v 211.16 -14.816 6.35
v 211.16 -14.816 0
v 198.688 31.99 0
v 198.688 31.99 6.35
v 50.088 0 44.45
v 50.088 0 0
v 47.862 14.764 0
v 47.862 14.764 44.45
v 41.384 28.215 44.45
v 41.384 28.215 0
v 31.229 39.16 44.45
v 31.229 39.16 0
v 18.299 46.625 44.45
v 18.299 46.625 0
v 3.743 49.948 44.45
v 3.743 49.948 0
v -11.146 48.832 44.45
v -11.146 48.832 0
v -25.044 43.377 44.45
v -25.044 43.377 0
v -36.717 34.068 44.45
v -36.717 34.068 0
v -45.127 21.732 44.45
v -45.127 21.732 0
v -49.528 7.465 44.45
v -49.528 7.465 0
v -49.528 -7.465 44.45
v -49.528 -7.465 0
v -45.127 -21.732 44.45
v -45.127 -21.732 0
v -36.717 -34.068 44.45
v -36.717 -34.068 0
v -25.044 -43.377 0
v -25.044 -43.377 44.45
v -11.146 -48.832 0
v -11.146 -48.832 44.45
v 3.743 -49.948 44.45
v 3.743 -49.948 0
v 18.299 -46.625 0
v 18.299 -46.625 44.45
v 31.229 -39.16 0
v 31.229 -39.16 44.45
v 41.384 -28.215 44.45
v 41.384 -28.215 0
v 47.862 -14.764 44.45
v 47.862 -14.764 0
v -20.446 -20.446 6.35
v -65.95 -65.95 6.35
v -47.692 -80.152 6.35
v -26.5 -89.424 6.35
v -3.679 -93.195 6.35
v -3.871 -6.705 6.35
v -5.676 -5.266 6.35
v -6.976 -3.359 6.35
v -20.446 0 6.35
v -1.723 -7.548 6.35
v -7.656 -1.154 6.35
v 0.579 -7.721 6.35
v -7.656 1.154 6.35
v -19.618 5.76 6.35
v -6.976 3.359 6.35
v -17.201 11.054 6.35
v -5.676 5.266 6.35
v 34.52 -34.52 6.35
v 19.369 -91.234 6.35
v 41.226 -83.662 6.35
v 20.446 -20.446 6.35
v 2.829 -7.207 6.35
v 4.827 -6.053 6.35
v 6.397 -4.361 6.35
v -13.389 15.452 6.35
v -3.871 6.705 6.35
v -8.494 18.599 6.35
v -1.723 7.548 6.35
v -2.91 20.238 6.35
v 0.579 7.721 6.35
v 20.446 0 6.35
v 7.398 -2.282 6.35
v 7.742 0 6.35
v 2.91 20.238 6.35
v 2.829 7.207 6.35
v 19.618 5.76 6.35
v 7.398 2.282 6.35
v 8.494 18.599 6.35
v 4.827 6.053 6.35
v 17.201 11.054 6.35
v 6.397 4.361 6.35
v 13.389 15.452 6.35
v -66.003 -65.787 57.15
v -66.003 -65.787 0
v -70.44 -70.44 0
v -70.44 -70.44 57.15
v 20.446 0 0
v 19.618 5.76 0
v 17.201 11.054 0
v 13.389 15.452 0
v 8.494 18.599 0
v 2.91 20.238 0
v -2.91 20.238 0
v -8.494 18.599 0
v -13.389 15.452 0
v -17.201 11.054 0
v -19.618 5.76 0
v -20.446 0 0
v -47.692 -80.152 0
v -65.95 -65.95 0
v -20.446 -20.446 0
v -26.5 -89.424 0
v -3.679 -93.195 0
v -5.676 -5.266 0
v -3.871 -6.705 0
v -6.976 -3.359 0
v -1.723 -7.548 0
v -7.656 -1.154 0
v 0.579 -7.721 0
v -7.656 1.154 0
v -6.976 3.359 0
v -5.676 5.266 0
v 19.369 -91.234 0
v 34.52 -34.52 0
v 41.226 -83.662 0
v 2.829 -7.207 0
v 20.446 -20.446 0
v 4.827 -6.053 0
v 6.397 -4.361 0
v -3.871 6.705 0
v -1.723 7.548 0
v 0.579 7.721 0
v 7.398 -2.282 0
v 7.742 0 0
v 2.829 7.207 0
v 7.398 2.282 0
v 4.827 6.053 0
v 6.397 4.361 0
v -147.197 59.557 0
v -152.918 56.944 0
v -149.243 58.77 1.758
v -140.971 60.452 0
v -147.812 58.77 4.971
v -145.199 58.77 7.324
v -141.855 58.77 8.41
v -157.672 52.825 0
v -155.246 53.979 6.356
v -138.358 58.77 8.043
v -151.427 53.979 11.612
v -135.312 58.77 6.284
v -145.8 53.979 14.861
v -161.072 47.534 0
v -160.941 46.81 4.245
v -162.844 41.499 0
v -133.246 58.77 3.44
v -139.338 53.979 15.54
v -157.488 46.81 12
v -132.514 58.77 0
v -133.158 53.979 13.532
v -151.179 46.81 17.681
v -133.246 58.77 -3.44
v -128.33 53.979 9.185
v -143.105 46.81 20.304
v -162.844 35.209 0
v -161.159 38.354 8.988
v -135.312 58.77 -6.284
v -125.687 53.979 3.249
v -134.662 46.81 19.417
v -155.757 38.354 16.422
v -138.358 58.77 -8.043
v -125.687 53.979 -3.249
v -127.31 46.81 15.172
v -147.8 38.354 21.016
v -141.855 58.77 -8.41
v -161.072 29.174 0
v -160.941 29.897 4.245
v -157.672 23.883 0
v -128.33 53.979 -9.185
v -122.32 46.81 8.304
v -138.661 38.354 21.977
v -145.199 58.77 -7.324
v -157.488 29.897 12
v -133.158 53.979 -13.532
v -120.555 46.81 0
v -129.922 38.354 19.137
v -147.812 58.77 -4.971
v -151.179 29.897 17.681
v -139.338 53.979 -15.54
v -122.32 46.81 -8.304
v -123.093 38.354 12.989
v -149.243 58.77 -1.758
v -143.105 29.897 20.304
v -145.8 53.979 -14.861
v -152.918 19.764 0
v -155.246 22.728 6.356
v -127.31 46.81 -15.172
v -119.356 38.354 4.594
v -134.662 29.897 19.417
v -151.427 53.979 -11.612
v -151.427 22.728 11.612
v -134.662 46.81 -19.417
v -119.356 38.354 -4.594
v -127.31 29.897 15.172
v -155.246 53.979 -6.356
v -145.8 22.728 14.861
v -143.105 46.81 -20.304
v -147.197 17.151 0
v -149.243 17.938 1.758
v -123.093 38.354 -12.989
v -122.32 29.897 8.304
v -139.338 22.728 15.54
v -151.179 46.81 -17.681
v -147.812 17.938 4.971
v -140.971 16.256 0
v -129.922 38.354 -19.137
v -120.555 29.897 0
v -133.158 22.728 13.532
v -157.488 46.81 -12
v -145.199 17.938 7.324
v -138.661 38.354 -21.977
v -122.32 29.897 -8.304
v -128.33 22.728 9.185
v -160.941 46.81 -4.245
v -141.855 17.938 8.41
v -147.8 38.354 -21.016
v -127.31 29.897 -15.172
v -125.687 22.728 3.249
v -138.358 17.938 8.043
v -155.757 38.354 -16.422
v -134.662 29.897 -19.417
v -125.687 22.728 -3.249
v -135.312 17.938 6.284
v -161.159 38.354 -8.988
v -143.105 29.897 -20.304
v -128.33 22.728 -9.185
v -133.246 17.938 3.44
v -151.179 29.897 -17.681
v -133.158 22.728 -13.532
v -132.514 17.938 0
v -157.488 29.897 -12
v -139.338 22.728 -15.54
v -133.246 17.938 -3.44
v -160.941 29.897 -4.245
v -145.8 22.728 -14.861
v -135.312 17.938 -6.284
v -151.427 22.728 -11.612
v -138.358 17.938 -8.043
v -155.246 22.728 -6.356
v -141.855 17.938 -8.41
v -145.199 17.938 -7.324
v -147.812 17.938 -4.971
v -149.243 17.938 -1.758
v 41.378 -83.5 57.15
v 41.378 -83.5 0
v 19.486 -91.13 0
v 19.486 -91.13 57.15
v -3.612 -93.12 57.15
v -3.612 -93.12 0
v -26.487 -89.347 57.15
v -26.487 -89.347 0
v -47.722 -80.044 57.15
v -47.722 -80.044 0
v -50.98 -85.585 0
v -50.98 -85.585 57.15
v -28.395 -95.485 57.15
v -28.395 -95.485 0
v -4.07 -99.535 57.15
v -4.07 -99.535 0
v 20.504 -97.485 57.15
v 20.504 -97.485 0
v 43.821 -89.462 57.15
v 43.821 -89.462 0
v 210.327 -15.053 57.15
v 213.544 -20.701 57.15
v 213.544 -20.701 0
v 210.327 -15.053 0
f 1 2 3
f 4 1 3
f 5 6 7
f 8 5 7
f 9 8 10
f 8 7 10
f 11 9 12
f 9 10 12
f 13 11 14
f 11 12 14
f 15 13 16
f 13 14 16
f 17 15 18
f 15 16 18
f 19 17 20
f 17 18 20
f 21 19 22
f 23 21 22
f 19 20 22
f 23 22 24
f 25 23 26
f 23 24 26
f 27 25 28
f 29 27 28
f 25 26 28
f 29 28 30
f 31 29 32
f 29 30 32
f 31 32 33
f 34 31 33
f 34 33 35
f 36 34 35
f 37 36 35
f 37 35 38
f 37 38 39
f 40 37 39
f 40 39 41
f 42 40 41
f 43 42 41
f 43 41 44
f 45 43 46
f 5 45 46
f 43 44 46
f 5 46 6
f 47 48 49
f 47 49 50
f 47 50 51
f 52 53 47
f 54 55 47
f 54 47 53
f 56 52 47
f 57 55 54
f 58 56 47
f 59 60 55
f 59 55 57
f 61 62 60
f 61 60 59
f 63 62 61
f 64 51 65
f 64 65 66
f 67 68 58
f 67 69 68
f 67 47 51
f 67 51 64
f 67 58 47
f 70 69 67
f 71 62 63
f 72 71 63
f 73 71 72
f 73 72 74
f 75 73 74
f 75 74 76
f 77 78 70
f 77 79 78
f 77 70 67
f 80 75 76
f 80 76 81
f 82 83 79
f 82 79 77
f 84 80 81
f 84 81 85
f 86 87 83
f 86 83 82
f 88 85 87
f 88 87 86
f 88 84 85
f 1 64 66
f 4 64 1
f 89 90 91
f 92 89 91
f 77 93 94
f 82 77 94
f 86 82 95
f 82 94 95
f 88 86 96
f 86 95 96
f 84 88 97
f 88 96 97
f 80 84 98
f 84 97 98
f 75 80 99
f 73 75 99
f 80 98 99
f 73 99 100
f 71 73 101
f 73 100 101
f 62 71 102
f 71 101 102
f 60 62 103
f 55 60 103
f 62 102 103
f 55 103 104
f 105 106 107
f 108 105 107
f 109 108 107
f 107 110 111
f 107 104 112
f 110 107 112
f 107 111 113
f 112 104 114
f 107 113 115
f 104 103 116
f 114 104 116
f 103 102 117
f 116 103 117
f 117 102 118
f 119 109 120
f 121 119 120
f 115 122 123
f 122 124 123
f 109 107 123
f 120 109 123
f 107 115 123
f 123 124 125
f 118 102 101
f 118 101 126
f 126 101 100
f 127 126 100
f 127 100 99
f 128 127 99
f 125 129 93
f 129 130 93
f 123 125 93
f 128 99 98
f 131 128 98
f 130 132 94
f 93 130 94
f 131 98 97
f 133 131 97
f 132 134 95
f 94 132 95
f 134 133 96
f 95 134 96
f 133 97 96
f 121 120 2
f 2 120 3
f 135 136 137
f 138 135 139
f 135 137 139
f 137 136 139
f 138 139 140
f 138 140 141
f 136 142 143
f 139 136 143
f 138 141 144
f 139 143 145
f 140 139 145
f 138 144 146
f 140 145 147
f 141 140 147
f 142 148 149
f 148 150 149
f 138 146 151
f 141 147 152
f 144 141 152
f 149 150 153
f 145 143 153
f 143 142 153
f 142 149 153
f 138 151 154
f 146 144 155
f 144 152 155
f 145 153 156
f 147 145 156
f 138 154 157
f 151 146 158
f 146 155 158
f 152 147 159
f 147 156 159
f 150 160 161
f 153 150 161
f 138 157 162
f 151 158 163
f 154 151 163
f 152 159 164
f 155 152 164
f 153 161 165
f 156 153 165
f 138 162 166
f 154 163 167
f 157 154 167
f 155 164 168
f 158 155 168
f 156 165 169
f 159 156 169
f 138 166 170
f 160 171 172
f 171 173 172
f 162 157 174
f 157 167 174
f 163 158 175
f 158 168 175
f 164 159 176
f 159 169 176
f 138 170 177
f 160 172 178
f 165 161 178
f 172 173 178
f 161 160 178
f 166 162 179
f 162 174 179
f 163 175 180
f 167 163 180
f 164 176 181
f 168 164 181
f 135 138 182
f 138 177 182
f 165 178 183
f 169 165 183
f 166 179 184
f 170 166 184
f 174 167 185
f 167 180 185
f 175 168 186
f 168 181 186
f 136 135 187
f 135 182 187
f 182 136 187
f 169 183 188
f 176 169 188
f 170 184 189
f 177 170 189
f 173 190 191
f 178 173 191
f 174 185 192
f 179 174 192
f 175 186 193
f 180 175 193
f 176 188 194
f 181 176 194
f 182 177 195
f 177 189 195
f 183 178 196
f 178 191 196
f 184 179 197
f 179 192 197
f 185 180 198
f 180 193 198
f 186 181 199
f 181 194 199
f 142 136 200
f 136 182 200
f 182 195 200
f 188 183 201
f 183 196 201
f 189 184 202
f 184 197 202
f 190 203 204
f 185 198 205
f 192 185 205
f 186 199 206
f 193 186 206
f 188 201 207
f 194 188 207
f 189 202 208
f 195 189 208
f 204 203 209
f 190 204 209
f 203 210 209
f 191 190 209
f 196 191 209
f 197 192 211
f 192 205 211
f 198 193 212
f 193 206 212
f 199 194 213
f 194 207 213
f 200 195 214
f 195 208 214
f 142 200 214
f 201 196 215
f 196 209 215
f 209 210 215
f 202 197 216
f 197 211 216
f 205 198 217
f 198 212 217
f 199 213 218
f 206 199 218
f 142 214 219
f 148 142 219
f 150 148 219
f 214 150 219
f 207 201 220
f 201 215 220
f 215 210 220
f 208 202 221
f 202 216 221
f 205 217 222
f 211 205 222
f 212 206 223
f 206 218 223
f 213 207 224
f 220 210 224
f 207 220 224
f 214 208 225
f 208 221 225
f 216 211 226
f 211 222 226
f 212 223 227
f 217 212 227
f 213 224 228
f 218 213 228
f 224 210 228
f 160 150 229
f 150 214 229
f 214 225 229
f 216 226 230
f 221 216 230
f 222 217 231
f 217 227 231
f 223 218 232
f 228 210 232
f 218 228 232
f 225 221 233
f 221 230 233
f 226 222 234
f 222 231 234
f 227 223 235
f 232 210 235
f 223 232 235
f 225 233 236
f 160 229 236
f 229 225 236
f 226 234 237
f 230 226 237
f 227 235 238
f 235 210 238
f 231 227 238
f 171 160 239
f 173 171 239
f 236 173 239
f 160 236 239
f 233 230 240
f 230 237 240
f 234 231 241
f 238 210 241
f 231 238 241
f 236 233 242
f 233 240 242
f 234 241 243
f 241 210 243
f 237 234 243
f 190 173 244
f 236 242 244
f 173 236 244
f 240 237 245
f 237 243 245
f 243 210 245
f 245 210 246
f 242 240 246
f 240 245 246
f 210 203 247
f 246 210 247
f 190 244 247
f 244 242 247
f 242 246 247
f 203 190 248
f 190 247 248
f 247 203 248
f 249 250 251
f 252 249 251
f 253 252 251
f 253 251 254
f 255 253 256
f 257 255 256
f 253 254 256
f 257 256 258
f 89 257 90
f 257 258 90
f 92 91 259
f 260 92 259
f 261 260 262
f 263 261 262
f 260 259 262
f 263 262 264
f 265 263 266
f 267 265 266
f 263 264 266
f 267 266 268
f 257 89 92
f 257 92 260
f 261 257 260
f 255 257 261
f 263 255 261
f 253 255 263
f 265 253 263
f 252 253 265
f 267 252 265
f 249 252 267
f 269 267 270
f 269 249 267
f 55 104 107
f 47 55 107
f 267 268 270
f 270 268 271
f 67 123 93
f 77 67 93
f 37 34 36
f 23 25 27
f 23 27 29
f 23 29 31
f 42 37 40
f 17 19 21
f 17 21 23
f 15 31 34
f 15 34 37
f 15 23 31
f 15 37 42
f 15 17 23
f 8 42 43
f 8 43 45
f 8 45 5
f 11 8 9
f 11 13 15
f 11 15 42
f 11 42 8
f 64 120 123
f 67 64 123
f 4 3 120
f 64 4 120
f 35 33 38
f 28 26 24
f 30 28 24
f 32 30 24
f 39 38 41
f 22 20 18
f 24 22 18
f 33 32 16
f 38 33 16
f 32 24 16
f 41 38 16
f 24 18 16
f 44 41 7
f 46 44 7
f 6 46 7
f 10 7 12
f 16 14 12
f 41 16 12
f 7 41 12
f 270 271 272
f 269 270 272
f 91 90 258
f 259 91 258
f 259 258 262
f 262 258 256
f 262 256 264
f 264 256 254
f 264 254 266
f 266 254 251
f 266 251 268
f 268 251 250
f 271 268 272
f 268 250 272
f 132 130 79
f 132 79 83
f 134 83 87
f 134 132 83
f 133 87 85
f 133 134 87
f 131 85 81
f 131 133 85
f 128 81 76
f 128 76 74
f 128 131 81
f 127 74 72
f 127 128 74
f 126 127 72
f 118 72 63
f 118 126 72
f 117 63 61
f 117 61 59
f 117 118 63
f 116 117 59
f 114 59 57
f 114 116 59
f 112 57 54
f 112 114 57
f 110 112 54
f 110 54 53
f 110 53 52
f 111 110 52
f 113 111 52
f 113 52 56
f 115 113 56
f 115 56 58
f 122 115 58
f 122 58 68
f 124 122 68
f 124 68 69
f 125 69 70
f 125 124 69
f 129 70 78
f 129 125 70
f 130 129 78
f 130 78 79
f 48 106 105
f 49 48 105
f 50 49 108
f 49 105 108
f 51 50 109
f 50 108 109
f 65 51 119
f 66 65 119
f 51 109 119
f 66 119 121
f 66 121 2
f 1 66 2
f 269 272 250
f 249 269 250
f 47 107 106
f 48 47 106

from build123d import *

# Parameters (mm, degrees)
F0_R     = 50.087737
F1_DEPTH = 44.45
F2_R     = 7.742347
F3_DEPTH = 6.35
F5_DEPTH = 57.15


with BuildPart() as f1:
    # F0 (on Top) → F1 (new body)
    with BuildSketch(Plane.XY):
        Circle(F0_R)
    extrude(amount=F1_DEPTH)


with BuildPart() as f3:
    # F2 (on Top) → F3 (new body)
    with BuildSketch(Plane.XY):
        with BuildLine():
            Line((-20.446297, -20.446297), (-65.950249, -65.950249))
            ThreePointArc((-65.950249, -65.950249), (-15.206813, -92.019691), (41.225954, -83.661768))
            Line((41.225954, -83.661768), (211.159874, -14.815901))
            Line((211.159874, -14.815901), (198.68803, 31.989686))
            Line((198.68803, 31.989686), (34.520162, -34.520162))
            Line((34.520162, -34.520162), (20.446297, -20.446297))
            Line((20.446297, -20.446297), (20.446297, 0))
            ThreePointArc((20.446297, 0), (0, 20.446297), (-20.446297, 0))
            Line((-20.446297, 0), (-20.446297, -20.446297))
        make_face()
        Circle(F2_R, mode=Mode.SUBTRACT)
    extrude(amount=F3_DEPTH)


with BuildPart() as f5:
    # F4 (on Top) → F5 (new body)
    with BuildSketch(Plane.XY):
        with BuildLine():
            Line((43.821449, -89.461579), (213.544225, -20.701253))
            Line((213.544225, -20.701253), (210.32686, -15.053405))
            Line((210.32686, -15.053405), (41.37789, -83.500236))
            ThreePointArc((41.37789, -83.500236), (-15.167106, -91.947693), (-66.003412, -65.7873))
            Line((-66.003412, -65.7873), (-70.440377, -70.440377))
            ThreePointArc((-70.440377, -70.440377), (-16.358281, -98.265457), (43.821449, -89.461579))
        make_face()
    extrude(amount=F5_DEPTH)


with BuildPart() as f7:
    # F6 (on Top) → F7 (revolve)
    with BuildSketch(Plane.XY):
        with BuildLine():
            Line((-140.97099, 38.35379), (-140.97099, 60.45179))
            ThreePointArc((-140.97099, 60.45179), (-163.06899, 38.35379), (-140.97099, 16.25579))
            Line((-140.97099, 16.25579), (-140.97099, 38.35379))
        make_face()
    revolve(axis=Axis((-140.97099, 49.40279, 0), (0, 1, 0)))


solid = Compound([f1.part, f3.part, f5.part, f7.part])
